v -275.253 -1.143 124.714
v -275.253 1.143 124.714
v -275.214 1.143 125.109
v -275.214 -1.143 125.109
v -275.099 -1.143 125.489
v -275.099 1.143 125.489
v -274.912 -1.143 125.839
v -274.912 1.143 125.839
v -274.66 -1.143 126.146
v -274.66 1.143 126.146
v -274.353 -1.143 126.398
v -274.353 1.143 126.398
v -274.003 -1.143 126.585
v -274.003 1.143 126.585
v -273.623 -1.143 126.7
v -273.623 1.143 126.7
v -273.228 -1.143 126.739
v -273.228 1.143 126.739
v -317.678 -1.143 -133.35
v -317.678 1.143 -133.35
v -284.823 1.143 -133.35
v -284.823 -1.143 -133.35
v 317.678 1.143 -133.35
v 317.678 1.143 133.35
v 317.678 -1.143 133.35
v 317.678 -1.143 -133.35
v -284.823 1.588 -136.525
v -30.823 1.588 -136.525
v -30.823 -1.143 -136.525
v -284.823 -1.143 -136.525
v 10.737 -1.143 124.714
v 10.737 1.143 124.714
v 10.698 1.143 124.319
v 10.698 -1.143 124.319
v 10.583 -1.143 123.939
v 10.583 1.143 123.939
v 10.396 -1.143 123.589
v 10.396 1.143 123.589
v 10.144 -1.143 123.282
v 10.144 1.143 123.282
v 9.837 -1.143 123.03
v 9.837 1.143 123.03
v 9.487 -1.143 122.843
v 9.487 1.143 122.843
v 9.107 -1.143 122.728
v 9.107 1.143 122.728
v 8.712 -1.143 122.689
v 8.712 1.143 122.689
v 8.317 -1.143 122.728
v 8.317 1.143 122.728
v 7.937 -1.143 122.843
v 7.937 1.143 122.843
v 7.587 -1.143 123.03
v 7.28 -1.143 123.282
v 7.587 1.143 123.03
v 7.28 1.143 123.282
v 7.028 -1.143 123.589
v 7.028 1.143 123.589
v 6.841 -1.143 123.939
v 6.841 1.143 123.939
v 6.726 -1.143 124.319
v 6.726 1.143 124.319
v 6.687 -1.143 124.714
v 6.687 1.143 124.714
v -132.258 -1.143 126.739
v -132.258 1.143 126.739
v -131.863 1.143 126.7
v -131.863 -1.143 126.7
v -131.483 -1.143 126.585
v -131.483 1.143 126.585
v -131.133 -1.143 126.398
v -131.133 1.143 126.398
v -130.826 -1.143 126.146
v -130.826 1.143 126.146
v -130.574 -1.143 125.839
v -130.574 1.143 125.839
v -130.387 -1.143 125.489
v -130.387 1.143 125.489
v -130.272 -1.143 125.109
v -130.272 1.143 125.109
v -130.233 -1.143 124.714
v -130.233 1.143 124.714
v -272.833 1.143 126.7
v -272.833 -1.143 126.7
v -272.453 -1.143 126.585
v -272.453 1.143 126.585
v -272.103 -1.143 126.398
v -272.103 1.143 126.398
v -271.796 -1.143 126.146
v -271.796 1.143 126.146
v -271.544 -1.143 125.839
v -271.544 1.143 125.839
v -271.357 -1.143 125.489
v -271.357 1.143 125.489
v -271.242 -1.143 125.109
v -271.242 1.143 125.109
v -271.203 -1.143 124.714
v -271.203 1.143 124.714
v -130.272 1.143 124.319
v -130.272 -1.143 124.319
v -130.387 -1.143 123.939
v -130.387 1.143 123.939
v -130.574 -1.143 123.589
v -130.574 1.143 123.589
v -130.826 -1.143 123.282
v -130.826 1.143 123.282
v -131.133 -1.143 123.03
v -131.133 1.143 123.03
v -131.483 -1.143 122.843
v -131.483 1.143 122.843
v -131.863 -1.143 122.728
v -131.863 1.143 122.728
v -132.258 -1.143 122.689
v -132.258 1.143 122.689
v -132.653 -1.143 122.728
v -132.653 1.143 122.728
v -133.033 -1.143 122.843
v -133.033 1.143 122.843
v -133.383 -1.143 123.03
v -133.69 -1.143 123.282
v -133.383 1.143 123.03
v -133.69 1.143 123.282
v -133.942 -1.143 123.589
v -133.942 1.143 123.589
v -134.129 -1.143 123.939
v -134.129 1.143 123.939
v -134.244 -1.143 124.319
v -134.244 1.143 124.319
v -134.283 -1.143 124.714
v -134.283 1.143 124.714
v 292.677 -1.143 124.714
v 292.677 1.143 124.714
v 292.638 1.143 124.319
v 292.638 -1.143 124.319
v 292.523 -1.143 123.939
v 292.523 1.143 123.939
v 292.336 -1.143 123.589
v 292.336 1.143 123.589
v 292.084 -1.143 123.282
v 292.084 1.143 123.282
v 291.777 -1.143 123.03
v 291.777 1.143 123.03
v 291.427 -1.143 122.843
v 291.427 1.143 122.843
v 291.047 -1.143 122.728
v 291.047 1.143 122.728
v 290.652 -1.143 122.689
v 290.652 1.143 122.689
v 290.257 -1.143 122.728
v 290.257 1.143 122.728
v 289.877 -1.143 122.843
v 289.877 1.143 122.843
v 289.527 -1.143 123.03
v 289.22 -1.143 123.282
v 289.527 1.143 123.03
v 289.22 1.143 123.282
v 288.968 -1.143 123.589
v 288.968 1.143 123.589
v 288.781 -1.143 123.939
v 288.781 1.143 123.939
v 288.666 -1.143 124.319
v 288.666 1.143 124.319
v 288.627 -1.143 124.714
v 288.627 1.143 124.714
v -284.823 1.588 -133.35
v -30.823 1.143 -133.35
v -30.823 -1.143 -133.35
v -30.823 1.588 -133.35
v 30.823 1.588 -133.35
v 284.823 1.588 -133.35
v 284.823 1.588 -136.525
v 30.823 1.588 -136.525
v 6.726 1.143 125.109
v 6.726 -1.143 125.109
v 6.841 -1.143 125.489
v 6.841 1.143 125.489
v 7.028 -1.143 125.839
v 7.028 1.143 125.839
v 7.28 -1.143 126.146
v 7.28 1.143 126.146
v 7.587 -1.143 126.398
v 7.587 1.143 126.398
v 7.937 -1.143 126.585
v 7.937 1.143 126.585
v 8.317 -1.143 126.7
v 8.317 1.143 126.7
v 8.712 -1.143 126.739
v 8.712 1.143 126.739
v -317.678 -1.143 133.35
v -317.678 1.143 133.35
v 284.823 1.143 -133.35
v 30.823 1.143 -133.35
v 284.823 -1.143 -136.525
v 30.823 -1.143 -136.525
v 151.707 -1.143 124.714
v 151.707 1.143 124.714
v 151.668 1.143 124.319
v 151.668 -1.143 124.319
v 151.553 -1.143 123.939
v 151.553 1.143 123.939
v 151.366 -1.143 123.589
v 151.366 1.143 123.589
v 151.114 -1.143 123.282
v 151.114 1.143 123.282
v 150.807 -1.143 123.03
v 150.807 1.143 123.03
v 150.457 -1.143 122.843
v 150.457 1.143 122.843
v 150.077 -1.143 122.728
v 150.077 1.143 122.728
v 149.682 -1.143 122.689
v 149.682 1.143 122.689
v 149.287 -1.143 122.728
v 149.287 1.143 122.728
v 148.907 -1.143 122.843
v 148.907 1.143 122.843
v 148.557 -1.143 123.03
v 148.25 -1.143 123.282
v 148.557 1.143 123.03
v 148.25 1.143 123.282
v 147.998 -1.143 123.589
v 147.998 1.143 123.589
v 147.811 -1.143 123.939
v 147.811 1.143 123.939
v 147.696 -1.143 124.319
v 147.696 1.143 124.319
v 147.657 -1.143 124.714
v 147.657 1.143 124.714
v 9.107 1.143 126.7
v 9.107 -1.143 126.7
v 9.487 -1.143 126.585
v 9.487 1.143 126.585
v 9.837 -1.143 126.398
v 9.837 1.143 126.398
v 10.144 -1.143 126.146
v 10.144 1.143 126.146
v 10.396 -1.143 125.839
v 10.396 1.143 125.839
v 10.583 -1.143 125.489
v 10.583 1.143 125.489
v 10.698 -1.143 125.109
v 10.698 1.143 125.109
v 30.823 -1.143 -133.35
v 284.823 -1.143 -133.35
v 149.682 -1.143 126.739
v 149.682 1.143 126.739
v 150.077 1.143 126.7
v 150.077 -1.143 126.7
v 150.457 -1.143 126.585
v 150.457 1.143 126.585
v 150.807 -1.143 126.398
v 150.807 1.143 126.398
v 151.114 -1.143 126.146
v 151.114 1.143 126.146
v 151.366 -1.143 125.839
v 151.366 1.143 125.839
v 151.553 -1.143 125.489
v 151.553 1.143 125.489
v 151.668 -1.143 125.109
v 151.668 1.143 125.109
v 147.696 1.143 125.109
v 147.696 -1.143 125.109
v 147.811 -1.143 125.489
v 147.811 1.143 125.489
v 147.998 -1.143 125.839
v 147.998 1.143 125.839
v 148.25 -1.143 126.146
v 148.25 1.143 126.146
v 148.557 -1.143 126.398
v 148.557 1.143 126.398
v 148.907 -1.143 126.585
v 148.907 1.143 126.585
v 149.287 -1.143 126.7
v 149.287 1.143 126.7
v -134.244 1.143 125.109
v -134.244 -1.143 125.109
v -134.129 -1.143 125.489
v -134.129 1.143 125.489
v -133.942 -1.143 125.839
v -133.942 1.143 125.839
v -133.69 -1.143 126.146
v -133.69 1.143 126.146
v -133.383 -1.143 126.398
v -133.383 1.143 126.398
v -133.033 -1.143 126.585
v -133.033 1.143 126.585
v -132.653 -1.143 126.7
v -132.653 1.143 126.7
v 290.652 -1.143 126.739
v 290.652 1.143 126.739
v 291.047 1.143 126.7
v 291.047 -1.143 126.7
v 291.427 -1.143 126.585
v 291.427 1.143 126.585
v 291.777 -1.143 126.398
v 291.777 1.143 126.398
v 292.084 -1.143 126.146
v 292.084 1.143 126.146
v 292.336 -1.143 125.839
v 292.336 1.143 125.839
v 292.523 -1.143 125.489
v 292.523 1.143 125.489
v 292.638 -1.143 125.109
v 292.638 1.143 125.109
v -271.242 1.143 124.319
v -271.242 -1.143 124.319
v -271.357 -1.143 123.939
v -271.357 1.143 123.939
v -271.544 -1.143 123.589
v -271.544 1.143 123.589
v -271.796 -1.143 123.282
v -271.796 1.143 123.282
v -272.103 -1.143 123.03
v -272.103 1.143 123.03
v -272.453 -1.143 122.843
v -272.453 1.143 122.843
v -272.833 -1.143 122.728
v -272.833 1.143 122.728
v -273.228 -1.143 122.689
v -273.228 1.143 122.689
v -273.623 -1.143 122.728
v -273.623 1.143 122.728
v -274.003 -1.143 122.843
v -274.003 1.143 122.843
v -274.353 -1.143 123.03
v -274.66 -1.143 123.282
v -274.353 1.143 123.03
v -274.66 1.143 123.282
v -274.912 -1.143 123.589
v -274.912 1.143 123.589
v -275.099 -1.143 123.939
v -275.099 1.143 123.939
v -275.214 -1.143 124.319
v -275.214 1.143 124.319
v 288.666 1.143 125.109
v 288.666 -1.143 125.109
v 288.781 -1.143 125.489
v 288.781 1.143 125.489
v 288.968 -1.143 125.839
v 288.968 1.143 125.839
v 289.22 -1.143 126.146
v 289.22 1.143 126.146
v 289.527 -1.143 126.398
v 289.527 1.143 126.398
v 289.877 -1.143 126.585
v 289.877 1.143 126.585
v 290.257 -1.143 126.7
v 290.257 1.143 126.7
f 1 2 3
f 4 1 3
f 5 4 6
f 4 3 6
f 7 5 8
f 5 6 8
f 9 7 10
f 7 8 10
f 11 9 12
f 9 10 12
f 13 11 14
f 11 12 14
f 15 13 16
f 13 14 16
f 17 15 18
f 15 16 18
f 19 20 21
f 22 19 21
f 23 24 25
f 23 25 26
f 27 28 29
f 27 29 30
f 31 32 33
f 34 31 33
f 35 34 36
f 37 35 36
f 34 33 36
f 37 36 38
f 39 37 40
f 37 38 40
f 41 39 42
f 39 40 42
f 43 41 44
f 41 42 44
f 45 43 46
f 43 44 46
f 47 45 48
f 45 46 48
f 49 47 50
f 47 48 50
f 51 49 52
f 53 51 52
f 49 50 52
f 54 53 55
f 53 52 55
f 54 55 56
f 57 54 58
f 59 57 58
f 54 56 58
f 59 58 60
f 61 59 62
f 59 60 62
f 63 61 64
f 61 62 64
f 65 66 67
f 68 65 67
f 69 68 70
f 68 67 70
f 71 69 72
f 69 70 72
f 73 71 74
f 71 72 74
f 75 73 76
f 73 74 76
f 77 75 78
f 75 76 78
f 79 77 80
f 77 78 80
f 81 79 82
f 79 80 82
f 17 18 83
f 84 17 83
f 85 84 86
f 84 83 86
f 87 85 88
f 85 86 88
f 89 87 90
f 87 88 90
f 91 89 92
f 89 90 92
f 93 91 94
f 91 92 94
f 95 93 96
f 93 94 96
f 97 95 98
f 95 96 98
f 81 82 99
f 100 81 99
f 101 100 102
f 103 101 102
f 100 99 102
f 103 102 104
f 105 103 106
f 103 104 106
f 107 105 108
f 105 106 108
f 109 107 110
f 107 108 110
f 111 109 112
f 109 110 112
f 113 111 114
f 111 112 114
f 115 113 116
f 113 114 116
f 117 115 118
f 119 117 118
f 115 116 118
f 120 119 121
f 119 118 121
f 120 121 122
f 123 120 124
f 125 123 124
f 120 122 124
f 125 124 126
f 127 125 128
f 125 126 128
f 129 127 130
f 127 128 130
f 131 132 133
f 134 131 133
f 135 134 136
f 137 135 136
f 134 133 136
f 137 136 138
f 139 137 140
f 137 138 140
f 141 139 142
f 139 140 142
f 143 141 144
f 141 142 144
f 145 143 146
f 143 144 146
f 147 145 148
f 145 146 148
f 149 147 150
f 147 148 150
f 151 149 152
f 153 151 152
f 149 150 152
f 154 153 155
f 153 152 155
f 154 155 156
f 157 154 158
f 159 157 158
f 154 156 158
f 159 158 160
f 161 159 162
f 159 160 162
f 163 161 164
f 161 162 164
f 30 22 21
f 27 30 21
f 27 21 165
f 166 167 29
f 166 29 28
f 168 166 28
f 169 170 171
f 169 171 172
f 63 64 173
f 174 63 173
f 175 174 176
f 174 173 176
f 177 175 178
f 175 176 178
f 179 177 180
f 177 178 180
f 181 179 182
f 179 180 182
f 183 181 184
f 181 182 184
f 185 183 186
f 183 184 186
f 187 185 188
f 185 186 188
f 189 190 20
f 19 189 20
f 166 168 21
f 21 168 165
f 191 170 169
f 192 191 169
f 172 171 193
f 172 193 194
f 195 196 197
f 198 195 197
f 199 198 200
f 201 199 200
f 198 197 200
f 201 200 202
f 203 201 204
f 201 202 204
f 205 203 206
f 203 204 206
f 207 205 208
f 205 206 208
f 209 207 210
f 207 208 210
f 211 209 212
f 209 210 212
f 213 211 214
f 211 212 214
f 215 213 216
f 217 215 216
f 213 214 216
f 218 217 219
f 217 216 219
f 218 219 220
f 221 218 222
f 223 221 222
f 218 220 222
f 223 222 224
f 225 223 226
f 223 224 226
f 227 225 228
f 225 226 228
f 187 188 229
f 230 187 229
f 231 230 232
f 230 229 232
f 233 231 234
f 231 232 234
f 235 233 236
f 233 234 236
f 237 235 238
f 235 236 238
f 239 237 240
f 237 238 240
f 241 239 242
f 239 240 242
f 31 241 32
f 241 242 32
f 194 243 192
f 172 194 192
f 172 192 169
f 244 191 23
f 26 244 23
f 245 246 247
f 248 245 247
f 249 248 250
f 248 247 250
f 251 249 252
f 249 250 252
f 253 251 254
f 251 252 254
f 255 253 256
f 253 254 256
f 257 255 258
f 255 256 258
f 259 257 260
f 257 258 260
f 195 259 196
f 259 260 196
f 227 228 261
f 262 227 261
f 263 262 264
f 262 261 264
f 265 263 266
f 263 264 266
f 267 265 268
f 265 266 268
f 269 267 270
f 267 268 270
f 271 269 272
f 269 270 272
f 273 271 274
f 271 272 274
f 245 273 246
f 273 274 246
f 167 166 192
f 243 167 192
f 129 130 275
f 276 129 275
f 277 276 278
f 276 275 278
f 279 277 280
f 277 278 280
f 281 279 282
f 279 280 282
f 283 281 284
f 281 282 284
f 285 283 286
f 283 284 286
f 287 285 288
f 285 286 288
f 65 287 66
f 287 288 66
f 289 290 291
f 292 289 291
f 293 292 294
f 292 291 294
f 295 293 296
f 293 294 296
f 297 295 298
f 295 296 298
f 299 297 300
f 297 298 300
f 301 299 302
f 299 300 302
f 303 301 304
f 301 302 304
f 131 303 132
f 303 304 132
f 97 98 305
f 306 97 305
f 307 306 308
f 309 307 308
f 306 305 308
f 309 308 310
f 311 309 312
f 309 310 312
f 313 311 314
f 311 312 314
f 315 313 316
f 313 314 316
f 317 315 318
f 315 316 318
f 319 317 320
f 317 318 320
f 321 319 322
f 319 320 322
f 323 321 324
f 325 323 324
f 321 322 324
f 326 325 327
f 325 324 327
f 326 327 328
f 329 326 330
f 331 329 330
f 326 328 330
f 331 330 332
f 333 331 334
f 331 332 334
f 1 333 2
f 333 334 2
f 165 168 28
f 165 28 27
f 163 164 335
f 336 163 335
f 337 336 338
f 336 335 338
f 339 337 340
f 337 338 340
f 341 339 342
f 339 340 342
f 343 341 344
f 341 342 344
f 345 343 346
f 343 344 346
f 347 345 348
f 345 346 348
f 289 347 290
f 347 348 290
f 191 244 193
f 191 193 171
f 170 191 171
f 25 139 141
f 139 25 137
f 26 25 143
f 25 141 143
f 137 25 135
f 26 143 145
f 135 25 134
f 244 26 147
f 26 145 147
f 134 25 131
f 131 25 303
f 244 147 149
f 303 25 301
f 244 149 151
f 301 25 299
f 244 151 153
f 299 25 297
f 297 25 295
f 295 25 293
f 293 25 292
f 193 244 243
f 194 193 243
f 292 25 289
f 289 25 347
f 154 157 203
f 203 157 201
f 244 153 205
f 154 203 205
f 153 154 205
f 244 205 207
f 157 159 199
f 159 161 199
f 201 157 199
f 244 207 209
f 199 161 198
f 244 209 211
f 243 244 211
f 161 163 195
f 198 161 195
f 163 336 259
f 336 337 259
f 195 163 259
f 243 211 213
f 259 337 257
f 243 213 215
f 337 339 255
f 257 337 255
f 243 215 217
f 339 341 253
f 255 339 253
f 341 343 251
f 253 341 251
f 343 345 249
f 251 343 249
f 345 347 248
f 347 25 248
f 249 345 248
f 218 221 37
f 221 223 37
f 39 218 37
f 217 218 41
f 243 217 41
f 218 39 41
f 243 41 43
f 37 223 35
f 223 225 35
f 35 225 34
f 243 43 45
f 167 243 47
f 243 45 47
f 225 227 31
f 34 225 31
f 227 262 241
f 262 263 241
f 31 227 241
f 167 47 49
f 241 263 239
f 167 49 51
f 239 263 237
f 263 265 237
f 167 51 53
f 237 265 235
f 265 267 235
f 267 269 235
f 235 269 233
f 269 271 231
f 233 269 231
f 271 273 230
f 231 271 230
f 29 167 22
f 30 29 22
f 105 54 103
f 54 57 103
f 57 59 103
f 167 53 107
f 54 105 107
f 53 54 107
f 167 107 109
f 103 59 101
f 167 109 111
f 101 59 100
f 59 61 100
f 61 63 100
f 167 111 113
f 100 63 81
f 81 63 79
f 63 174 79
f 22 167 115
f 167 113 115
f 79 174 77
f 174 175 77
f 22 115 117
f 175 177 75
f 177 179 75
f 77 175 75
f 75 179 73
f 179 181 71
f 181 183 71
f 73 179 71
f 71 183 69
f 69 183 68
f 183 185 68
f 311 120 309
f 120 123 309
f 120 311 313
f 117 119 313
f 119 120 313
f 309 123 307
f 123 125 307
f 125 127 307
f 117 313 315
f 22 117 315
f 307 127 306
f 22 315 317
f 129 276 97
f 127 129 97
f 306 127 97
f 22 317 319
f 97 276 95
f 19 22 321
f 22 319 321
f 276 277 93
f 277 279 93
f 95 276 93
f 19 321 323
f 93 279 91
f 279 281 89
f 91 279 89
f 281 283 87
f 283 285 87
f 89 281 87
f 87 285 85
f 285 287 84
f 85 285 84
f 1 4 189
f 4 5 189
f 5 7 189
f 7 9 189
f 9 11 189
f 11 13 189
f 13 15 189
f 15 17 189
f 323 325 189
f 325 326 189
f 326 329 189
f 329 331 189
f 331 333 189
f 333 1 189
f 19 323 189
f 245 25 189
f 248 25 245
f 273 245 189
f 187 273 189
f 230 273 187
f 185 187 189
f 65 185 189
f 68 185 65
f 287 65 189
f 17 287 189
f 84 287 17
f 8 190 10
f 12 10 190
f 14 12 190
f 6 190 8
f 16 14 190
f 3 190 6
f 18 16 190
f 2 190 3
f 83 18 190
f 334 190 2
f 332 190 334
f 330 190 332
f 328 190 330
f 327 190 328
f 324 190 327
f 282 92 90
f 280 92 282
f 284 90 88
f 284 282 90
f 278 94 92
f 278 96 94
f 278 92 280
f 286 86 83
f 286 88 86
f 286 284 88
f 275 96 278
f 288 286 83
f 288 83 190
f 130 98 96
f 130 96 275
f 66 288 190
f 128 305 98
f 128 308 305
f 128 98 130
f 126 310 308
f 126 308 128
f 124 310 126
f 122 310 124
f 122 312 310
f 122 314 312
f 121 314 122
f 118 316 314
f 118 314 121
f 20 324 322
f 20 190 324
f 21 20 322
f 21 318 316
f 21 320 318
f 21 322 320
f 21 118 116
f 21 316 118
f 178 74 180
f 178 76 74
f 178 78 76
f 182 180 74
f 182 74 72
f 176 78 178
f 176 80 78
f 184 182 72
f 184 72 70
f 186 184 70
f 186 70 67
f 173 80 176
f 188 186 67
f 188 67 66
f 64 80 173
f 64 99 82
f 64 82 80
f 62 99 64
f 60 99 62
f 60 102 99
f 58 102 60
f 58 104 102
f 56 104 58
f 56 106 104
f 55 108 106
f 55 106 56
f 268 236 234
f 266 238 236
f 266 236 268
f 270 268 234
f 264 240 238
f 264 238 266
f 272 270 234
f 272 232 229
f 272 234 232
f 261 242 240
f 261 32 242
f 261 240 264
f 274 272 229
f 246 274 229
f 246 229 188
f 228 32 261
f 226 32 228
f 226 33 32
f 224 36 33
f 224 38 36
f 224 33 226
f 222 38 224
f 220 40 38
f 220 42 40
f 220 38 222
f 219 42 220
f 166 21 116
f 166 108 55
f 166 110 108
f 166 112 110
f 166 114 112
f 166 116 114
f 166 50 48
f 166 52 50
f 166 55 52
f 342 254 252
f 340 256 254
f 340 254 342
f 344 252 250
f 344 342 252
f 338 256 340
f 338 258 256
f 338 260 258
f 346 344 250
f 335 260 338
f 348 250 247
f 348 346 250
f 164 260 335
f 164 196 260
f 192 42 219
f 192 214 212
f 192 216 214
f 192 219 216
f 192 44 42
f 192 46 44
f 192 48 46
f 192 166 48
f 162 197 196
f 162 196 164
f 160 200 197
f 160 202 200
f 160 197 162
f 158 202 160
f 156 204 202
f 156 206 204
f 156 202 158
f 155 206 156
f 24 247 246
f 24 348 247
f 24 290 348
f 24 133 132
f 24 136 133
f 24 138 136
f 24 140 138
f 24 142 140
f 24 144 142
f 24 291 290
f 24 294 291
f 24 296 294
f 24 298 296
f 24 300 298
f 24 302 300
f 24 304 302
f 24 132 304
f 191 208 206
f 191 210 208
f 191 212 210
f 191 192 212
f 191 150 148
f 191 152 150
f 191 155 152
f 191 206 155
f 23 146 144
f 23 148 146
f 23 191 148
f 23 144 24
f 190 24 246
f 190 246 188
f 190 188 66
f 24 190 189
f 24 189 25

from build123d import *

# Parameters (mm, degrees)
SKETCH1_W           = 635.3556
SKETCH1_H           = 266.7
BOSS_EXTRUDE1_DEPTH = 1.143
SKETCH2_W           = 254
SKETCH2_H           = 2.7305
BOSS_EXTRUDE2_DEPTH = 3.175
CUT_EXTRUDE1_DEPTH  = 10
LPATTERN1_COUNT     = 5
LPATTERN1_PITCH     = 140.97


with BuildPart() as part:
    # Sketch1 → Boss-Extrude1 (new, symmetric)
    with BuildSketch(Plane(origin=(0, 0, 0), x_dir=(1, 0, 0), z_dir=(0, 1, 0))):
        Rectangle(SKETCH1_W, SKETCH1_H)
    extrude(amount=BOSS_EXTRUDE1_DEPTH, both=True)

    # Sketch2 → Boss-Extrude2 (add)
    with BuildSketch(Plane(origin=(0, 0, -133.35), x_dir=(-1, 0, 0), z_dir=(0, 0, -1))):
        with Locations((-157.8229, 0.22225)):
            Rectangle(SKETCH2_W, SKETCH2_H)
        with Locations((157.8229, 0.22225)):
            Rectangle(SKETCH2_W, SKETCH2_H)
    extrude(amount=BOSS_EXTRUDE2_DEPTH)

    # Sketch3 → Cut-Extrude1 (cut, symmetric)
    with BuildSketch(Plane(origin=(0, 1.143, 0), x_dir=(1, 0, 0), z_dir=(0, 1, 0))):
        with BuildLine():
            ThreePointArc((-275.2528, -124.714), (-274.659691232, -126.145891232), (-273.2278, -126.739))
            Line((-273.2278, -126.739), (-273.2278, -124.714))
            Line((-273.2278, -124.714), (-275.2528, -124.714))
        make_face()
        with BuildLine():
            Line((-273.2278, -124.714), (-273.2278, -126.739))
            ThreePointArc((-273.2278, -126.739), (-271.795908768, -126.145891232), (-271.2028, -124.714))
            ThreePointArc((-271.2028, -124.714), (-273.2278, -122.689), (-275.2528, -124.714))
            Line((-275.2528, -124.714), (-273.2278, -124.714))
        make_face()
    cut_extrude1 = extrude(amount=CUT_EXTRUDE1_DEPTH, both=True, mode=Mode.SUBTRACT)

    # LPattern1: Cut-Extrude1 ×5
    with Locations(*[(i * LPATTERN1_PITCH, 0, 0) for i in range(1, LPATTERN1_COUNT)]):
        add(cut_extrude1, mode=Mode.SUBTRACT)


solid = part.part
